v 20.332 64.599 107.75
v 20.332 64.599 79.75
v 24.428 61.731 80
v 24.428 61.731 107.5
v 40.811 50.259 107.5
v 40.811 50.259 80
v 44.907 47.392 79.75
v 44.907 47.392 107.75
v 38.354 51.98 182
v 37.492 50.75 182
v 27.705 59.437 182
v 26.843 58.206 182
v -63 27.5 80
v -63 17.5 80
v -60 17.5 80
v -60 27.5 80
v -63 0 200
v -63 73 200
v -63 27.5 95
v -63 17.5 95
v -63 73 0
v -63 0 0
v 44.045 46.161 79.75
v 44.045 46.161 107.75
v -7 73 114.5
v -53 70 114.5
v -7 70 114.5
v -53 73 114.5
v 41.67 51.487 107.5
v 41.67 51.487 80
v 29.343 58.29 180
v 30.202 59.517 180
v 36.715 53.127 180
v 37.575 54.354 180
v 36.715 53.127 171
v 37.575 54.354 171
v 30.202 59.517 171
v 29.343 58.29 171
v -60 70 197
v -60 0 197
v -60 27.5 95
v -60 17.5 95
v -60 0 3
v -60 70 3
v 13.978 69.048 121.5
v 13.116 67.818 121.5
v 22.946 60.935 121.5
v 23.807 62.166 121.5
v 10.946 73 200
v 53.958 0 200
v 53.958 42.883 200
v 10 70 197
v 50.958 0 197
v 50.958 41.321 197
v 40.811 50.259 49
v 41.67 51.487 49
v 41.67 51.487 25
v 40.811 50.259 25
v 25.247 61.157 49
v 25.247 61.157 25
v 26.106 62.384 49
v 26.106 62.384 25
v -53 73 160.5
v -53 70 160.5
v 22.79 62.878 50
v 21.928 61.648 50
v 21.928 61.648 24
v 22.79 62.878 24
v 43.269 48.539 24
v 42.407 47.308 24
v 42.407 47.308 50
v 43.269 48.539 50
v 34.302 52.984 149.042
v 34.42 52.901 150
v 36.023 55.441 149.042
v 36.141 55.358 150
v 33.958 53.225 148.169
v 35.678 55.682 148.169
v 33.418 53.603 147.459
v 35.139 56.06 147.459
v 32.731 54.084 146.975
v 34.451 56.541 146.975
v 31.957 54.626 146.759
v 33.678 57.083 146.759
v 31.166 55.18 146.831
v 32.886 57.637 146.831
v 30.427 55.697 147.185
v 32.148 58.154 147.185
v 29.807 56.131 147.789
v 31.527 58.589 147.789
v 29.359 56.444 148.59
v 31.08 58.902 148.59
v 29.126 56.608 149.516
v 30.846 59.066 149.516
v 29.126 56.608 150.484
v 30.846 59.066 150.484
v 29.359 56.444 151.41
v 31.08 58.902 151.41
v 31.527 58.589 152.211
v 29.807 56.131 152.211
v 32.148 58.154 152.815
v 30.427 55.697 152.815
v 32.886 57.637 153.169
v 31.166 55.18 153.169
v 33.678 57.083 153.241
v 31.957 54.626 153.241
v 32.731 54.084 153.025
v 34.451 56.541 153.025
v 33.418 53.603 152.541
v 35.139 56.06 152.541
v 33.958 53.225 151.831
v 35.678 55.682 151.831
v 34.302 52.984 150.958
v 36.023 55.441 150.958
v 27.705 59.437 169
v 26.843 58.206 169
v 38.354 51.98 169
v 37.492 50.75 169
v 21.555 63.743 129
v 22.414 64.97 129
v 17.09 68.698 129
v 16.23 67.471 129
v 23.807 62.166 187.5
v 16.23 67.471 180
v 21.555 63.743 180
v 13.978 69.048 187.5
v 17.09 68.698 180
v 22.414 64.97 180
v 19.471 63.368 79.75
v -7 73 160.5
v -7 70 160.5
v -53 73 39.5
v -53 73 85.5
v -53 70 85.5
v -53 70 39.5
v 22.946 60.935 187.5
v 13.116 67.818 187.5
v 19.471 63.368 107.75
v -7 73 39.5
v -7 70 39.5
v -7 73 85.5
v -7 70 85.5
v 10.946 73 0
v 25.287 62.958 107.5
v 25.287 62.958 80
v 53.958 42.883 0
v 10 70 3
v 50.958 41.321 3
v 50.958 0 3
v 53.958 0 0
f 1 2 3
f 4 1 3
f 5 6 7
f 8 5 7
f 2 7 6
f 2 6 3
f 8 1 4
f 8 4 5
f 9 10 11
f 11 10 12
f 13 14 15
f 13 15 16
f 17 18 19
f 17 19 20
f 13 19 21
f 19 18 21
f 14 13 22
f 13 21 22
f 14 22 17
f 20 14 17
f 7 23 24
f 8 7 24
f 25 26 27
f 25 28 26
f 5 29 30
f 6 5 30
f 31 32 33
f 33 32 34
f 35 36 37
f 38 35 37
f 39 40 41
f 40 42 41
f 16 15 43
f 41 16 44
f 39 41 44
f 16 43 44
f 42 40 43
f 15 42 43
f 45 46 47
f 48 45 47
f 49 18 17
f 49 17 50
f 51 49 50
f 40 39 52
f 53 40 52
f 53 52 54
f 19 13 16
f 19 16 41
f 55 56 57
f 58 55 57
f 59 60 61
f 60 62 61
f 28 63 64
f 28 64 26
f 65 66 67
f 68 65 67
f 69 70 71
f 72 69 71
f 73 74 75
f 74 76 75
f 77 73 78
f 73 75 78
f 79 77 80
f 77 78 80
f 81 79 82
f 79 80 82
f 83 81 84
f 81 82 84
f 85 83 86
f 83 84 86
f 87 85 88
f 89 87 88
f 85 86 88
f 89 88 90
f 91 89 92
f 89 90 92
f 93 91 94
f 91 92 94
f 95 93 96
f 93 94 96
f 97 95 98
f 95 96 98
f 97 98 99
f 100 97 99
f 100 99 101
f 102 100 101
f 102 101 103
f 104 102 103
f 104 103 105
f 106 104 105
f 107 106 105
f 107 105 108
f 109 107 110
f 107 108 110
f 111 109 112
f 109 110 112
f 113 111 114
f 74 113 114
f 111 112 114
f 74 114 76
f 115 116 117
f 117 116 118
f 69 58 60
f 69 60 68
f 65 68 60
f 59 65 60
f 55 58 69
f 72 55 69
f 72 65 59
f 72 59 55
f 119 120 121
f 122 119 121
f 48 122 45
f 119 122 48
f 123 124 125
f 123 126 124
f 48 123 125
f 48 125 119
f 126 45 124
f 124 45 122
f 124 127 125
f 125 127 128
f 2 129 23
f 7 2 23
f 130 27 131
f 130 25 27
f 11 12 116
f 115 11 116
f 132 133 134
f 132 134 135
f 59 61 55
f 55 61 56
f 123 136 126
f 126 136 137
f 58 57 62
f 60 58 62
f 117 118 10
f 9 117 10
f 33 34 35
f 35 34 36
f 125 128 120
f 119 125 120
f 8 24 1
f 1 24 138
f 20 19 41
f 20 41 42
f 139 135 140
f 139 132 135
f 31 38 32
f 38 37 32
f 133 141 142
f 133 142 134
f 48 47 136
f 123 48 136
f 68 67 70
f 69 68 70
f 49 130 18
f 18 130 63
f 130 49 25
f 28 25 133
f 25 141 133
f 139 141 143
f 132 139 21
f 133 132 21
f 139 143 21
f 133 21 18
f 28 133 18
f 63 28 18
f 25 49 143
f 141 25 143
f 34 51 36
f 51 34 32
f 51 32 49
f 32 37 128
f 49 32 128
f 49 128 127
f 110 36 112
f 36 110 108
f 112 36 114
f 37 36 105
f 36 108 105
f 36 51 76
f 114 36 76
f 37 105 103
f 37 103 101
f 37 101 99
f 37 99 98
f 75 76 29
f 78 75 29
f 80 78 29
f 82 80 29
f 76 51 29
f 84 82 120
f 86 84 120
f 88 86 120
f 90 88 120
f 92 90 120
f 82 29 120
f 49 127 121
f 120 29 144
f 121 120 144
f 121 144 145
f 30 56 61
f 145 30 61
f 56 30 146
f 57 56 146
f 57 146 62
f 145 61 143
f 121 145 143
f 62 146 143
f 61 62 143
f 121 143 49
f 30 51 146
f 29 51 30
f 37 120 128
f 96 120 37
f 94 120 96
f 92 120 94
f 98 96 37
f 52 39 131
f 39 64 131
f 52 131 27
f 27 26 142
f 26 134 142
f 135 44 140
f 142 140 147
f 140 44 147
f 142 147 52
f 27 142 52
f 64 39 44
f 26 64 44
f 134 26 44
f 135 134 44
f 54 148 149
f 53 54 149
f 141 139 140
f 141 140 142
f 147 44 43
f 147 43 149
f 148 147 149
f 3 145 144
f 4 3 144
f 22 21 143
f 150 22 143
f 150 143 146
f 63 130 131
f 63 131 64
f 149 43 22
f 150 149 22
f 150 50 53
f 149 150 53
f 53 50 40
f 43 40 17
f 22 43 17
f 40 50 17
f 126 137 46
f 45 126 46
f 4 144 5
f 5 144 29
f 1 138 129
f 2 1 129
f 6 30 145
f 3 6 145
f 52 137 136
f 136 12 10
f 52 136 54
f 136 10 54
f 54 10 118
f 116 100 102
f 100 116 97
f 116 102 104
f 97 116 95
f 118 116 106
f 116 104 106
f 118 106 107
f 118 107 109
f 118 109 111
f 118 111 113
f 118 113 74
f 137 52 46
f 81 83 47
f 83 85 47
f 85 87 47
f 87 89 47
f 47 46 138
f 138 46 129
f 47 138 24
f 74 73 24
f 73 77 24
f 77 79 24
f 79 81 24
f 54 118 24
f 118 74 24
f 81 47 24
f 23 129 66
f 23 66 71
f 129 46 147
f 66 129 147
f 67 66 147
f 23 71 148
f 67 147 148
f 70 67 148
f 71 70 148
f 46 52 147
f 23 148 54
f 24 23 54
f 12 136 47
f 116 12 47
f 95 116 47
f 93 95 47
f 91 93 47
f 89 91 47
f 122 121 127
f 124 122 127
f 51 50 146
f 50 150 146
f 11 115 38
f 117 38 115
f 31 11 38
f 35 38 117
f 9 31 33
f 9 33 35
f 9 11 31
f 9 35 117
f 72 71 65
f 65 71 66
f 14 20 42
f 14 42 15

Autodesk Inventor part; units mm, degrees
ref_plane "YZ Plane" through (0, 0, 0) normal (1, 0, 0) x (0, 1, 0)
ref_plane "XZ Plane" through (0, 0, 0) normal (0, 1, 0) x (-1, 0, 0)
ref_plane "XY Plane" through (0, 0, 0) normal (0, 0, 1) x (1, 0, 0)
sketch "Sketch1" plane through (0, 0, 0) normal (0, 0, 1) x (1, 0, 0)
  line L0 (-60, 0) -> (-60, 70)
  line L1 (-60, 70) -> (10, 70)
  line L2 (10, 70) -> (50.9576, 41.3212)
  line L3 (50.9576, 41.3212) -> (50.9576, 0)
  line L4 (53.9576, 0) -> (53.9576, 42.8829)
  line L5 (53.9576, 42.8829) -> (10.9459, 73)
  line L6 (10.9459, 73) -> (-63, 73)
  line L7 (-63, 73) -> (-63, 0)
  line L8 (53.9576, 0) -> (50.9576, 0)
  line L9 (-60, 0) -> (-63, 0)
  point P0 (0, 0)
  dimension "d0" = 70
  dimension "d1" = 70
  dimension "d2" = 145
  dimension "d4" = 50
  dimension "d5" = 60
  dimension "d90" = 3
extrude "Extrusion1" add sketch "Sketch1" along normal blind 200
sketch "Sketch2" plane through (-63, 73, 0) normal (0, 1, 0) x (1, 0, 0)
  line L0 (10, -39.5) -> (56, -39.5)
  line L1 (56, -39.5) -> (56, -85.5)
  line L2 (56, -85.5) -> (10, -85.5)
  line L3 (10, -85.5) -> (10, -39.5)
  line L4 (0, 0) -> (0, -200) projected
  line L5 (73.9459, 0) -> (0, 0) projected
  line L6 (56, -160.5) -> (10, -160.5)
  line L7 (56, -114.5) -> (56, -160.5)
  line L8 (10, -160.5) -> (10, -114.5)
  line L9 (10, -114.5) -> (56, -114.5)
  point P0 (63, 0)
  dimension "d9" = 46
  dimension "d10" = 46
  dimension "d11" = 10
  dimension "d12" = 39.5
  dimension "d15" = 75
extrude "Extrusion2" cut sketch "Sketch2" against normal blind 200
sketch "Sketch10" plane through (-63, 0, 0) normal (-1, 0, 0) x (0, 0, 1)
  line L0 (80, 27.5) -> (95, 27.5)
  line L1 (95, 27.5) -> (95, 17.5)
  line L2 (95, 17.5) -> (80, 17.5)
  line L3 (80, 17.5) -> (80, 27.5)
  line L4 (0, 0) -> (200, 0) projected
  line L5 (0, 73) -> (0, 0) projected
  dimension "d84" = 17.5
  dimension "d85" = 80
  dimension "d86" = 15
  dimension "d87" = 10
extrude "Extrusion10" cut sketch "Sketch10" against normal blind 10
sketch "Sketch15" plane through (0, 0, 200) normal (0, 0, 1) x (1, 0, 0)
  line L0 (-60, 0) -> (-60, 70) projected
  line L1 (-60, 0) -> (-60, 70)
  line L2 (10, 70) -> (50.9576, 41.3212) projected
  line L3 (-60, 70) -> (10, 70)
  line L4 (50.9576, 41.3212) -> (50.9576, 0) projected
  line L5 (10, 70) -> (50.9576, 41.3212)
  line L6 (50.9576, 41.3212) -> (50.9576, 0)
  line L7 (50.9576, 0) -> (-60, 0)
  point P0 (0, 0)
extrude "Extrusion11" add sketch "Sketch15" against normal blind 3
pattern_linear "Rectangular Pattern3" count 2 spacing 197 along (0, 0, -1) of "Extrusion11"
sketch "Sketch16" plane through (10.9459, 73, 200) normal (0.5736, 0.8192, 0) x (0.8192, -0.5736, 0)
  line L0 (17.5076, 92.5) -> (37.5076, 92.5)
  line L1 (37.5076, 92.5) -> (37.5076, 120)
  line L2 (37.5076, 120) -> (17.5076, 120)
  line L3 (17.5076, 120) -> (17.5076, 92.5)
  line L4 (52.5076, 200) -> (52.5076, 0) projected
  line L5 (52.5076, 200) -> (0, 200) projected
  line L6 (18.5076, 151) -> (37.5076, 151)
  line L7 (37.5076, 151) -> (37.5076, 175)
  line L8 (37.5076, 175) -> (18.5076, 175)
  line L9 (18.5076, 175) -> (18.5076, 151)
  circle A0 centre (27.5076, 50) radius 3.25
  line L10 (23.5076, 20) -> (32.5076, 20)
  line L11 (32.5076, 20) -> (32.5076, 29)
  line L12 (32.5076, 29) -> (23.5076, 29)
  line L13 (23.5076, 29) -> (23.5076, 20)
  line L14 (52.5076, 0) -> (0, 0) projected
  line L15 (7.5, 20) -> (14, 20)
  line L16 (14, 20) -> (14, 71)
  line L17 (14, 71) -> (7.5, 71)
  line L18 (7.5, 71) -> (7.5, 20)
  line L19 (0, 200) -> (0, 0) projected
  point P0 (32.9047, 200)
  dimension "d99" = 20
  dimension "d100" = 27.5
  dimension "d101" = 15
  dimension "d102" = 80
  dimension "d103" = 24
  dimension "d104" = 19
  dimension "d105" = 15
  dimension "d106" = 25
  dimension "d107" = 6.5
  dimension "d108" = 9
  dimension "d109" = 9
  dimension "d110" = 20
  dimension "d111" = 25
  dimension "d112" = 50
  dimension "d113" = 20
  dimension "d114" = 6.5
  dimension "d115" = 51
  dimension "d116" = 7.5
  dimension "d117" = 20
extrude "Extrusion12" cut sketch "Sketch16" against normal blind 3 contours L3 L2 L1 L0 | L9 L8 L7 L6 | A0 | L13 L12 L11 L10 | L18 L17 L16 L15
sketch "Sketch17" plane through (50.9576, 41.3212, 3) normal (-0.5736, -0.8192, 0) x (0.8192, -0.5736, 0)
  line L0 (-38.4383, 76.75) -> (-8.4383, 76.75)
  line L1 (-8.4383, 76.75) -> (-8.4383, 104.75)
  line L2 (-8.4383, 104.75) -> (-38.4383, 104.75)
  line L3 (-38.4383, 104.75) -> (-38.4383, 76.75)
  line L4 (-46.1959, 118.5) -> (-34.1959, 118.5)
  line L5 (-34.1959, 118.5) -> (-34.1959, 184.5)
  line L6 (-34.1959, 184.5) -> (-46.1959, 184.5)
  line L7 (-46.1959, 184.5) -> (-46.1959, 118.5)
  line L8 (-29.4383, 166) -> (-16.4383, 166)
  line L9 (-16.4383, 166) -> (-16.4383, 179)
  line L10 (-16.4383, 179) -> (-29.4383, 179)
  line L11 (-29.4383, 179) -> (-29.4383, 166)
  line L12 (-36.9459, 177) -> (-36.9459, 126) projected
  line L13 (-43.4459, 177) -> (-36.9459, 177) projected
  line L14 (-27.4383, 177) -> (-18.4383, 177) projected
  line L15 (-27.4383, 168) -> (-27.4383, 177) projected
  line L16 (-33.4383, 104.5) -> (-13.4383, 104.5) projected
  line L17 (-33.4383, 77) -> (-33.4383, 104.5) projected
  line L18 (-35.4383, 21) -> (-10.4383, 21)
  line L19 (-10.4383, 21) -> (-10.4383, 47)
  line L20 (-10.4383, 47) -> (-35.4383, 47)
  line L21 (-35.4383, 47) -> (-35.4383, 21)
  line L22 (-32.4383, 46) -> (-13.4383, 46) projected
  line L23 (-32.4383, 22) -> (-32.4383, 46) projected
  point P0 (-18.0412, -3)
  point P1 (-34.1959, 151.5)
  point P2 (-36.9459, 151.5)
  point P3 (-40.1959, 177)
  point P4 (-40.1959, 184.5)
  point P5 (-22.9383, 179)
  point P6 (-22.9383, 177)
  point P7 (-29.4383, 172.5)
  point P8 (-27.4383, 172.5)
  point P9 (-23.4383, 104.75)
  point P10 (-23.4383, 104.5)
  point P11 (-33.4383, 90.75)
  point P12 (-38.4383, 90.75)
  point P13 (-22.9383, 47)
  point P14 (-22.9383, 46)
  point P15 (-32.4383, 34)
  point P16 (-35.4383, 34)
  dimension "d120" = 66
  dimension "d121" = 12
  dimension "d122" = 13
  dimension "d123" = 13
  dimension "d124" = 30
  dimension "d125" = 28
  dimension "d126" = 26
  dimension "d127" = 25
extrude "Extrusion13" cut sketch "Sketch17" against normal blind 1.5
properties part number "albox"
